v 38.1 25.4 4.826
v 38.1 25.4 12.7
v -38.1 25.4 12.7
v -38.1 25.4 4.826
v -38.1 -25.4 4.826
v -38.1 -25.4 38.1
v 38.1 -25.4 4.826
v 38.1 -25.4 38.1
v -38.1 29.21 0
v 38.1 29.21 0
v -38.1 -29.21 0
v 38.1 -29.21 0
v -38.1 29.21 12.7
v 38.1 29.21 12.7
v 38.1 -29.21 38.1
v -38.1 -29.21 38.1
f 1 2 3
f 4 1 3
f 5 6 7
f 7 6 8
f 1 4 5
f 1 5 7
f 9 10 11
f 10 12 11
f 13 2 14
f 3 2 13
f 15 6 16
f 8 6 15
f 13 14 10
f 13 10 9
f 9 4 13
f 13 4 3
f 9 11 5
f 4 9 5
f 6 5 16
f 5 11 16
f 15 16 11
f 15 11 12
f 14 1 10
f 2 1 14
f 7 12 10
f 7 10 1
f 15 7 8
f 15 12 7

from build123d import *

# Parameters (mm, degrees)
F0_W     = 76.2
F0_H     = 50.8
F2_DEPTH = 4.826
F3_W     = 76.2
F3_H     = 38.1
F4_DEPTH = 3.81
F5_W     = 76.2
F5_H     = 12.7
F6_DEPTH = 3.81


with BuildPart() as f2:
    # F0 (on Top) → F2 (new body)
    with BuildSketch(Plane.XY):
        Rectangle(F0_W, F0_H)
    extrude(amount=F2_DEPTH)

    # F3 (on face) → F4 (join)
    with BuildSketch(Plane.XZ.offset(25.4)):
        with Locations((0, 19.05)):
            Rectangle(F3_W, F3_H)
    extrude(amount=F4_DEPTH)

    # F5 (on face) → F6 (join)
    with BuildSketch(Plane(origin=(0, 25.4, 0), x_dir=(-1, 0, 0), z_dir=(0, 1, 0))):
        with Locations((0, 6.35)):
            Rectangle(F5_W, F5_H)
    extrude(amount=F6_DEPTH)


solid = f2.part
